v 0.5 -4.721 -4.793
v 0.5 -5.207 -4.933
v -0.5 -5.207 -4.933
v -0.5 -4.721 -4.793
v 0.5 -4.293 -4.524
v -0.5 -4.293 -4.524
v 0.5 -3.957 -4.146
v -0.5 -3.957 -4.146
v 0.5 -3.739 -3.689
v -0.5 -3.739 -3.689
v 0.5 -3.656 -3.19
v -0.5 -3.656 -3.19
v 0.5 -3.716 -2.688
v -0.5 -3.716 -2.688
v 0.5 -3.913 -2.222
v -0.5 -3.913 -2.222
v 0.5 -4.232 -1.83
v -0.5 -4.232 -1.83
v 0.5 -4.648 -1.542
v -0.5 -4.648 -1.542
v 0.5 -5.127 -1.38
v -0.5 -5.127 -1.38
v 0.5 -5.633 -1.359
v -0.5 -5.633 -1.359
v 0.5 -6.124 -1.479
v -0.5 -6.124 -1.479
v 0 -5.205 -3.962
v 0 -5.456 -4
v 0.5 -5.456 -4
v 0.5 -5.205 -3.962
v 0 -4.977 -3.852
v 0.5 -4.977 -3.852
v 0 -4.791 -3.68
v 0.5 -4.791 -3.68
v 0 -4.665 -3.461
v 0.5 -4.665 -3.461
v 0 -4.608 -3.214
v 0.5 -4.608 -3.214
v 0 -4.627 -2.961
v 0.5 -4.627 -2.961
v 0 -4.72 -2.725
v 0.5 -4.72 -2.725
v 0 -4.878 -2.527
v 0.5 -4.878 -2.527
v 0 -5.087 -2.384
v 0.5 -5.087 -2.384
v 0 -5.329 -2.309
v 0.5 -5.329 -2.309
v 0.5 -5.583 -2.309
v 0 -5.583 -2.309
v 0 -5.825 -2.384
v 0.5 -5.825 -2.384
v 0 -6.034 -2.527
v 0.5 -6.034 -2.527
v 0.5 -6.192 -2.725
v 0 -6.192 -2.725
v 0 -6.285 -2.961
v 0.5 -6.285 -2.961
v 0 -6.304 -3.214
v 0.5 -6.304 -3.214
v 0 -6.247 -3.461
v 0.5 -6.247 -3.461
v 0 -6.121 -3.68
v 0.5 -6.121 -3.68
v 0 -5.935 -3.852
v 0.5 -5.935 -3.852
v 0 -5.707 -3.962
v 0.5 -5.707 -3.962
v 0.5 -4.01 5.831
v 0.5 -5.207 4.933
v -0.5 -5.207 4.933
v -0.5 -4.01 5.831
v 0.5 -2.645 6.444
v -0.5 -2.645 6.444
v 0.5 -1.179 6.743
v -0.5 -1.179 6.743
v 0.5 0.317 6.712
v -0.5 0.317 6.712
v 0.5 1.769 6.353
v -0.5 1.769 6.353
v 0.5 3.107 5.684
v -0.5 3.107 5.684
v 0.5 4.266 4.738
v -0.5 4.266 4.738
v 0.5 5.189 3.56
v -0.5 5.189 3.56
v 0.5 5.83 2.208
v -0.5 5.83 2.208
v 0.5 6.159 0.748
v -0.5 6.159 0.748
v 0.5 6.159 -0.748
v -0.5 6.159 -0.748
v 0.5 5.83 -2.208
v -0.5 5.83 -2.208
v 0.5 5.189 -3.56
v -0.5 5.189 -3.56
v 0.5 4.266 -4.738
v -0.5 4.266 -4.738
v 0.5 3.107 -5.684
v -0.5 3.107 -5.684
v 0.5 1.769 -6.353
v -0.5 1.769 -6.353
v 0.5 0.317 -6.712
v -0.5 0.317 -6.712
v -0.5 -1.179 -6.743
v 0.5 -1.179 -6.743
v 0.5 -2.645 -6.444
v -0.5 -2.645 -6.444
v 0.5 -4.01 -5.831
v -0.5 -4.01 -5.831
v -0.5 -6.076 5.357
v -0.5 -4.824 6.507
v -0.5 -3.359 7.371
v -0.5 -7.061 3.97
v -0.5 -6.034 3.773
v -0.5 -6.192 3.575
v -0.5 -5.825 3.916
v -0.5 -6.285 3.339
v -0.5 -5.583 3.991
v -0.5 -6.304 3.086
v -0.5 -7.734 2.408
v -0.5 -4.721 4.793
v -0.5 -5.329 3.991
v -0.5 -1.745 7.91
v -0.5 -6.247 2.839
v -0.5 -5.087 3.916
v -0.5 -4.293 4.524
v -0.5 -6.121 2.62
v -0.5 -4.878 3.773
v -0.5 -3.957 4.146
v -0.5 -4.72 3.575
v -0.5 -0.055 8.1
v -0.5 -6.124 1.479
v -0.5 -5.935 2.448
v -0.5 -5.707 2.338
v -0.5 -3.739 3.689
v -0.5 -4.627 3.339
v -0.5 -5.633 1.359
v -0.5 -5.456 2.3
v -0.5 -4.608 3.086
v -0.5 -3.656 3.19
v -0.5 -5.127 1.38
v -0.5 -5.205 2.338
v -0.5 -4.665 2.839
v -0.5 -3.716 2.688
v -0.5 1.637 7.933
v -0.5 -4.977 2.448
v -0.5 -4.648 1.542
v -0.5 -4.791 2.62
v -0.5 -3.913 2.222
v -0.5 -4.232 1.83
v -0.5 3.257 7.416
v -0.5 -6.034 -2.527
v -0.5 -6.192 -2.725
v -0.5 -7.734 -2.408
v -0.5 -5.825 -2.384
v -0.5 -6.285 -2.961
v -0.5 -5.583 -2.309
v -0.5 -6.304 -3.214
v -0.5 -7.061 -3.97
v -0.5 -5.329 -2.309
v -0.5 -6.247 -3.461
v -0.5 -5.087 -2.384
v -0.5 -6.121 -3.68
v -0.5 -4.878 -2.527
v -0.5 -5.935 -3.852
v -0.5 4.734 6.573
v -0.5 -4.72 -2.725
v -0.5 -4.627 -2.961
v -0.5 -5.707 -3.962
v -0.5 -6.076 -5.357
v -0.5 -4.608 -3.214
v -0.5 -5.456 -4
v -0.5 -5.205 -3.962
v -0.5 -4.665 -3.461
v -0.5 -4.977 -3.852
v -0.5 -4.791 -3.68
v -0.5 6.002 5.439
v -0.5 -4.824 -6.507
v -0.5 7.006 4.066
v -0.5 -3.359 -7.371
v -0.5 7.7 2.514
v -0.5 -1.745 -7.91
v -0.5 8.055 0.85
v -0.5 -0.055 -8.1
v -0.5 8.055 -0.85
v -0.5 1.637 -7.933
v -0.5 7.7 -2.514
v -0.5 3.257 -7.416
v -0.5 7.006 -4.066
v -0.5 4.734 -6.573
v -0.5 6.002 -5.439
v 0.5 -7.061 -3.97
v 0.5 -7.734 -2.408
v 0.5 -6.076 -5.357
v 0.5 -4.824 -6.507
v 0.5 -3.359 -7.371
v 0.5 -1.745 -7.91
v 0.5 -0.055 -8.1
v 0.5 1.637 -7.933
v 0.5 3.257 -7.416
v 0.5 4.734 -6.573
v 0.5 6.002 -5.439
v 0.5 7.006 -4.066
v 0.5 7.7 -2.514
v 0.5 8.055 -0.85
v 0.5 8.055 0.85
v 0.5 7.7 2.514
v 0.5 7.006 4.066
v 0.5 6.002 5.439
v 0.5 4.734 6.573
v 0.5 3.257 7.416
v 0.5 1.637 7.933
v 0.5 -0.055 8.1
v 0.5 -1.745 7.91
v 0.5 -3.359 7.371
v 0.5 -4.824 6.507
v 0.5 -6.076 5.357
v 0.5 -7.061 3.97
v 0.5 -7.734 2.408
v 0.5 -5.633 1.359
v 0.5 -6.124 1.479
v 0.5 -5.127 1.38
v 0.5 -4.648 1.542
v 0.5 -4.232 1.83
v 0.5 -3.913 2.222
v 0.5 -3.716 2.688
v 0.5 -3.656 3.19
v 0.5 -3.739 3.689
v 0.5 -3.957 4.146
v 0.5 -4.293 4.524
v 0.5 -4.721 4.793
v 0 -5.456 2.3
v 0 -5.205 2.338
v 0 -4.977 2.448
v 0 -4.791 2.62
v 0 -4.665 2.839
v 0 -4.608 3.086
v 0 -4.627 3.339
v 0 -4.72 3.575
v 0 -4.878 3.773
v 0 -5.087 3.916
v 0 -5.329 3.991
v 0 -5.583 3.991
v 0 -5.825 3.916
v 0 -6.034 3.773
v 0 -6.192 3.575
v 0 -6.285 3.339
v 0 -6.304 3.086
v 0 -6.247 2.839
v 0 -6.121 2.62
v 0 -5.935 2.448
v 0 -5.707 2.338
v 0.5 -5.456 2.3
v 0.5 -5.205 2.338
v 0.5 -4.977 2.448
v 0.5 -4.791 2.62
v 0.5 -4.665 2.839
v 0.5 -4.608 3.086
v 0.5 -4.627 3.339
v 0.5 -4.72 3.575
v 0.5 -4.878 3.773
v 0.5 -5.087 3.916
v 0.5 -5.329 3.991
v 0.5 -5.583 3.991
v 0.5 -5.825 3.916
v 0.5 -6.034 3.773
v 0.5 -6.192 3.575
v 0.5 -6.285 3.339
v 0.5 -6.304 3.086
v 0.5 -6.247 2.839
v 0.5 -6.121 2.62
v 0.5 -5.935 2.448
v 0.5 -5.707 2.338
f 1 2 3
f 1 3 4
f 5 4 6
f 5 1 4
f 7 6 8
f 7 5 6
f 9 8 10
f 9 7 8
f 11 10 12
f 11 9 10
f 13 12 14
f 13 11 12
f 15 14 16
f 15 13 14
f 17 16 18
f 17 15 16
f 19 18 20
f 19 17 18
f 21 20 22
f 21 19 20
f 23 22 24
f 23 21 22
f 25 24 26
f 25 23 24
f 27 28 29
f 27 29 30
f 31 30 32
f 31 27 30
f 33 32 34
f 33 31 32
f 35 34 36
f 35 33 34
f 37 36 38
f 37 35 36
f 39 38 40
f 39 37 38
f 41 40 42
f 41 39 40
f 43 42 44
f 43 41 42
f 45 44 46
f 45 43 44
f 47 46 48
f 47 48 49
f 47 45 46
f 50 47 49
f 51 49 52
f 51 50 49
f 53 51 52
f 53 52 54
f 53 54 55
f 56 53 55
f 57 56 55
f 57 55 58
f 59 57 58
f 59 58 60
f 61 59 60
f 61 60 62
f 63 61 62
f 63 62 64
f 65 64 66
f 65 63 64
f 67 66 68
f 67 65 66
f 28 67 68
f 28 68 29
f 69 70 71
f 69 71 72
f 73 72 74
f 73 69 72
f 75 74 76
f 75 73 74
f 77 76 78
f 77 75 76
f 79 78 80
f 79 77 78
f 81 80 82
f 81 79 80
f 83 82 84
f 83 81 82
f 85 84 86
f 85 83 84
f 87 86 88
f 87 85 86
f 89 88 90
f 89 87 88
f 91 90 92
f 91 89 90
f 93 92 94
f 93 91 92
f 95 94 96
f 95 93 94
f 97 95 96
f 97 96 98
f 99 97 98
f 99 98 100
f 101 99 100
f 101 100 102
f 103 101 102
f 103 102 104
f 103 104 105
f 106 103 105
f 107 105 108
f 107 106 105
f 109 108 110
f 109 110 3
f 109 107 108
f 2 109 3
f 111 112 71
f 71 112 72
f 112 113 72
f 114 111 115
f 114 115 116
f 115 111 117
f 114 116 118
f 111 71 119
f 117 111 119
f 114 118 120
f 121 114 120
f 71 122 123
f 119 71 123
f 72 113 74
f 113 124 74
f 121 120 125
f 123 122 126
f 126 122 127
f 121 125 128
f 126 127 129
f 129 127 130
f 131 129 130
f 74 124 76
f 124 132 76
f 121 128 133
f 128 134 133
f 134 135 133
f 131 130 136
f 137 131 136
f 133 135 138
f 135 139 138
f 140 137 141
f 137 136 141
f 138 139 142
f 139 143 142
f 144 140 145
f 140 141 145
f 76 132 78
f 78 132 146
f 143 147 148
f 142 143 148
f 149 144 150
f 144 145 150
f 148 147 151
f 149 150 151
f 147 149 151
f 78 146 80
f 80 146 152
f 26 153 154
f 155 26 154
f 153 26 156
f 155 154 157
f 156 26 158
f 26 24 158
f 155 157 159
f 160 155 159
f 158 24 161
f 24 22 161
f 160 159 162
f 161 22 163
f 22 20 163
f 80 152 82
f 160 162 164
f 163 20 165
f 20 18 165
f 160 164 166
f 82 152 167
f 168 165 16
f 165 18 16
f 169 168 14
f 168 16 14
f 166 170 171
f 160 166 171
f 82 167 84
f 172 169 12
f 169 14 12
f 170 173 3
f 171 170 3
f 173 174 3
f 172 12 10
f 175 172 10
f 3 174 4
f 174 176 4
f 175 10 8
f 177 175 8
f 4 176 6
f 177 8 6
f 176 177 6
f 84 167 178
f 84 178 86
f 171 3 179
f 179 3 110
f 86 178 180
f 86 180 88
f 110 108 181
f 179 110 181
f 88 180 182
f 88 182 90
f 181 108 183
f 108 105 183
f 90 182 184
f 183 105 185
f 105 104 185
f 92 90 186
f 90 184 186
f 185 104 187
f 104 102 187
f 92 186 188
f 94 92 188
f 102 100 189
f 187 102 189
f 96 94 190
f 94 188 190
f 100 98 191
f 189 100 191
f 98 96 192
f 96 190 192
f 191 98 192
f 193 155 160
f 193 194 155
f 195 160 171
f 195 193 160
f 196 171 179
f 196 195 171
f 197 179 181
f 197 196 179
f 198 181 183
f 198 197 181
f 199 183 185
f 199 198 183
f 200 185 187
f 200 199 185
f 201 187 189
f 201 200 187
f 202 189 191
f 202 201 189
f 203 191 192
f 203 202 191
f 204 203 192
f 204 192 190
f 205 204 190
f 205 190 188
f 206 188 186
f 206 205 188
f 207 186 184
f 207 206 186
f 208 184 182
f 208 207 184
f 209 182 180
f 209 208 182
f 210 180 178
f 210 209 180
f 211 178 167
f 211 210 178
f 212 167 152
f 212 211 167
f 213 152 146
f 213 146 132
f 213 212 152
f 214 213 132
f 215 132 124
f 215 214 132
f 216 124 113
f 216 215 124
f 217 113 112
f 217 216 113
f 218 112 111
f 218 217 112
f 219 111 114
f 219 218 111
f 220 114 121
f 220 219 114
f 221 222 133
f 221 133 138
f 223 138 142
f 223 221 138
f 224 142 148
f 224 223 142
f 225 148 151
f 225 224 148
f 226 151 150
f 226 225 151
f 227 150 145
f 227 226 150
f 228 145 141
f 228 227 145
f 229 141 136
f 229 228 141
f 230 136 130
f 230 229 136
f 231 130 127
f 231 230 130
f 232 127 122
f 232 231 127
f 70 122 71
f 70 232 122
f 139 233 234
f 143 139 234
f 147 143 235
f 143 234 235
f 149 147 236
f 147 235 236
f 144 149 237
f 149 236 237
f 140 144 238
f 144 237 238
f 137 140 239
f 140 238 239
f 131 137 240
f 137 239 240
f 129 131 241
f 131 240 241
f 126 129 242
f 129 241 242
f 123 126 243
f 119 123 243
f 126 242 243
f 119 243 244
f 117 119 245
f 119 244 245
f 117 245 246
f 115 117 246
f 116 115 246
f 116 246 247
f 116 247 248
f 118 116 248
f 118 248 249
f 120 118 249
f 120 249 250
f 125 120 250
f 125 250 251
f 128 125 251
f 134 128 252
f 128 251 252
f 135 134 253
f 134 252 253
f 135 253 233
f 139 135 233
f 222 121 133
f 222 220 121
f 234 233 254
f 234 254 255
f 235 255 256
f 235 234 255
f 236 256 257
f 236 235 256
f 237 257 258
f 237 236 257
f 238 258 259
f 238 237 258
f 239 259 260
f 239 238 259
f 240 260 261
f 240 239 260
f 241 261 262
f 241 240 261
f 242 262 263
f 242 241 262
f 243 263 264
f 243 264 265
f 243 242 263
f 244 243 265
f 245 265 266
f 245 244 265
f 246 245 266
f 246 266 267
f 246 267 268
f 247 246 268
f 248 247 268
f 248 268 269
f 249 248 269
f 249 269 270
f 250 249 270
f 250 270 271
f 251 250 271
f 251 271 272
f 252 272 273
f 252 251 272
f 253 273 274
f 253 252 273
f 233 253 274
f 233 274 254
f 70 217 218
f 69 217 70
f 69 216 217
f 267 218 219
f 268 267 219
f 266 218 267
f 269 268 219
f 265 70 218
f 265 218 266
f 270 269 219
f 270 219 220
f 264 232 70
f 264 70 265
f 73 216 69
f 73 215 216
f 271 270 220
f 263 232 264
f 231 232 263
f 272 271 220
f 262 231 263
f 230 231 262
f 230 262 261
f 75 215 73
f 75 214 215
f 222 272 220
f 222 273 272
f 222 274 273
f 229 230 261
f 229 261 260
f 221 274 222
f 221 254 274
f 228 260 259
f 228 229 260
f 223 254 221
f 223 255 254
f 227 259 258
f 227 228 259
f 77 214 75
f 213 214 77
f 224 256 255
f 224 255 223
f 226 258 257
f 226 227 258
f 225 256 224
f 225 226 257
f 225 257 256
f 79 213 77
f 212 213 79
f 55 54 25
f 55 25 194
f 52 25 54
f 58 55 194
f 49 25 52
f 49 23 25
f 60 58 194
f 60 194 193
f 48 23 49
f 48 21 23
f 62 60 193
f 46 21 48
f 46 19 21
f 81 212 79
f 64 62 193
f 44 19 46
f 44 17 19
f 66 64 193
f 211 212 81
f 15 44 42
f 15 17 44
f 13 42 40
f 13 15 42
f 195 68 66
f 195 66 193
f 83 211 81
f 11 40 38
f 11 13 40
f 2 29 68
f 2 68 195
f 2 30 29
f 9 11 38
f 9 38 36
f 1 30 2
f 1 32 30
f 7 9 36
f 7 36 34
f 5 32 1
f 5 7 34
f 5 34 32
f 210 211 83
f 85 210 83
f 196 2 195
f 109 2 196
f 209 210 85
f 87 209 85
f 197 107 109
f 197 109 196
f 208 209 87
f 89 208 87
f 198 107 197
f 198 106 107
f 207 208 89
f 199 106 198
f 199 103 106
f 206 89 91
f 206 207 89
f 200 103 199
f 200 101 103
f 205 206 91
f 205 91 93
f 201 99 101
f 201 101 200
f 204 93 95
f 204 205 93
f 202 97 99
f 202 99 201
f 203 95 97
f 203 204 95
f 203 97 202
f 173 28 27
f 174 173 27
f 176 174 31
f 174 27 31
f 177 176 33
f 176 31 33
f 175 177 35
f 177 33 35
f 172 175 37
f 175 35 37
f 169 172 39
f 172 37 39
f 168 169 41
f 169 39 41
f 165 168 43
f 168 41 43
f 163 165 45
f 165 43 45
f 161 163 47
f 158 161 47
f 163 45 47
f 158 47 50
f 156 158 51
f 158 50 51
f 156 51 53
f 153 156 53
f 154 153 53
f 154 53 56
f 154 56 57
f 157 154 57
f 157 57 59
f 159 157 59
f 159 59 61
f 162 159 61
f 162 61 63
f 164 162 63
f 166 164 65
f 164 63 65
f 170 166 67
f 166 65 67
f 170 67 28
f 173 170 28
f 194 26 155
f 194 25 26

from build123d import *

# Parameters (mm, degrees)
BOSS_EXTRUDE1_DEPTH      = 0.5
BOSS_EXTRUDE1_DEPTH_BACK = 0.5
SKETCH1_R                = 0.85


with BuildPart() as part:
    # Sketch1 → Boss-Extrude1 (new, two sides: drawn at the far end of the back side and taken through both)
    with BuildSketch(Plane(origin=(0, 0, 0), x_dir=(0, 0, -1), z_dir=(1, 0, 0)).offset(-BOSS_EXTRUDE1_DEPTH_BACK)):
        with BuildLine():
            Line((-2.40796943, -7.733801344), (-1.478571429, -6.124036784))
            ThreePointArc((-1.478571429, -6.124036784), (-2.688100389, -3.716233413), (-4.932694682, -5.20696271))
            ThreePointArc((-4.932694682, -5.20696271), (0, 6.2), (4.932694682, -5.20696271))
            ThreePointArc((4.932694682, -5.20696271), (2.688100389, -3.716233413), (1.478571429, -6.124036784))
            Line((1.478571429, -6.124036784), (2.40796943, -7.733801344))
            ThreePointArc((2.40796943, -7.733801344), (0, 8.1), (-2.40796943, -7.733801344))
        make_face()
        with Locations((3.15, -5.455960044)):
            Circle(SKETCH1_R, mode=Mode.SUBTRACT)
        with Locations((-3.15, -5.455960044)):
            Circle(SKETCH1_R, mode=Mode.SUBTRACT)
    extrude(amount=BOSS_EXTRUDE1_DEPTH + BOSS_EXTRUDE1_DEPTH_BACK)


solid = part.part
